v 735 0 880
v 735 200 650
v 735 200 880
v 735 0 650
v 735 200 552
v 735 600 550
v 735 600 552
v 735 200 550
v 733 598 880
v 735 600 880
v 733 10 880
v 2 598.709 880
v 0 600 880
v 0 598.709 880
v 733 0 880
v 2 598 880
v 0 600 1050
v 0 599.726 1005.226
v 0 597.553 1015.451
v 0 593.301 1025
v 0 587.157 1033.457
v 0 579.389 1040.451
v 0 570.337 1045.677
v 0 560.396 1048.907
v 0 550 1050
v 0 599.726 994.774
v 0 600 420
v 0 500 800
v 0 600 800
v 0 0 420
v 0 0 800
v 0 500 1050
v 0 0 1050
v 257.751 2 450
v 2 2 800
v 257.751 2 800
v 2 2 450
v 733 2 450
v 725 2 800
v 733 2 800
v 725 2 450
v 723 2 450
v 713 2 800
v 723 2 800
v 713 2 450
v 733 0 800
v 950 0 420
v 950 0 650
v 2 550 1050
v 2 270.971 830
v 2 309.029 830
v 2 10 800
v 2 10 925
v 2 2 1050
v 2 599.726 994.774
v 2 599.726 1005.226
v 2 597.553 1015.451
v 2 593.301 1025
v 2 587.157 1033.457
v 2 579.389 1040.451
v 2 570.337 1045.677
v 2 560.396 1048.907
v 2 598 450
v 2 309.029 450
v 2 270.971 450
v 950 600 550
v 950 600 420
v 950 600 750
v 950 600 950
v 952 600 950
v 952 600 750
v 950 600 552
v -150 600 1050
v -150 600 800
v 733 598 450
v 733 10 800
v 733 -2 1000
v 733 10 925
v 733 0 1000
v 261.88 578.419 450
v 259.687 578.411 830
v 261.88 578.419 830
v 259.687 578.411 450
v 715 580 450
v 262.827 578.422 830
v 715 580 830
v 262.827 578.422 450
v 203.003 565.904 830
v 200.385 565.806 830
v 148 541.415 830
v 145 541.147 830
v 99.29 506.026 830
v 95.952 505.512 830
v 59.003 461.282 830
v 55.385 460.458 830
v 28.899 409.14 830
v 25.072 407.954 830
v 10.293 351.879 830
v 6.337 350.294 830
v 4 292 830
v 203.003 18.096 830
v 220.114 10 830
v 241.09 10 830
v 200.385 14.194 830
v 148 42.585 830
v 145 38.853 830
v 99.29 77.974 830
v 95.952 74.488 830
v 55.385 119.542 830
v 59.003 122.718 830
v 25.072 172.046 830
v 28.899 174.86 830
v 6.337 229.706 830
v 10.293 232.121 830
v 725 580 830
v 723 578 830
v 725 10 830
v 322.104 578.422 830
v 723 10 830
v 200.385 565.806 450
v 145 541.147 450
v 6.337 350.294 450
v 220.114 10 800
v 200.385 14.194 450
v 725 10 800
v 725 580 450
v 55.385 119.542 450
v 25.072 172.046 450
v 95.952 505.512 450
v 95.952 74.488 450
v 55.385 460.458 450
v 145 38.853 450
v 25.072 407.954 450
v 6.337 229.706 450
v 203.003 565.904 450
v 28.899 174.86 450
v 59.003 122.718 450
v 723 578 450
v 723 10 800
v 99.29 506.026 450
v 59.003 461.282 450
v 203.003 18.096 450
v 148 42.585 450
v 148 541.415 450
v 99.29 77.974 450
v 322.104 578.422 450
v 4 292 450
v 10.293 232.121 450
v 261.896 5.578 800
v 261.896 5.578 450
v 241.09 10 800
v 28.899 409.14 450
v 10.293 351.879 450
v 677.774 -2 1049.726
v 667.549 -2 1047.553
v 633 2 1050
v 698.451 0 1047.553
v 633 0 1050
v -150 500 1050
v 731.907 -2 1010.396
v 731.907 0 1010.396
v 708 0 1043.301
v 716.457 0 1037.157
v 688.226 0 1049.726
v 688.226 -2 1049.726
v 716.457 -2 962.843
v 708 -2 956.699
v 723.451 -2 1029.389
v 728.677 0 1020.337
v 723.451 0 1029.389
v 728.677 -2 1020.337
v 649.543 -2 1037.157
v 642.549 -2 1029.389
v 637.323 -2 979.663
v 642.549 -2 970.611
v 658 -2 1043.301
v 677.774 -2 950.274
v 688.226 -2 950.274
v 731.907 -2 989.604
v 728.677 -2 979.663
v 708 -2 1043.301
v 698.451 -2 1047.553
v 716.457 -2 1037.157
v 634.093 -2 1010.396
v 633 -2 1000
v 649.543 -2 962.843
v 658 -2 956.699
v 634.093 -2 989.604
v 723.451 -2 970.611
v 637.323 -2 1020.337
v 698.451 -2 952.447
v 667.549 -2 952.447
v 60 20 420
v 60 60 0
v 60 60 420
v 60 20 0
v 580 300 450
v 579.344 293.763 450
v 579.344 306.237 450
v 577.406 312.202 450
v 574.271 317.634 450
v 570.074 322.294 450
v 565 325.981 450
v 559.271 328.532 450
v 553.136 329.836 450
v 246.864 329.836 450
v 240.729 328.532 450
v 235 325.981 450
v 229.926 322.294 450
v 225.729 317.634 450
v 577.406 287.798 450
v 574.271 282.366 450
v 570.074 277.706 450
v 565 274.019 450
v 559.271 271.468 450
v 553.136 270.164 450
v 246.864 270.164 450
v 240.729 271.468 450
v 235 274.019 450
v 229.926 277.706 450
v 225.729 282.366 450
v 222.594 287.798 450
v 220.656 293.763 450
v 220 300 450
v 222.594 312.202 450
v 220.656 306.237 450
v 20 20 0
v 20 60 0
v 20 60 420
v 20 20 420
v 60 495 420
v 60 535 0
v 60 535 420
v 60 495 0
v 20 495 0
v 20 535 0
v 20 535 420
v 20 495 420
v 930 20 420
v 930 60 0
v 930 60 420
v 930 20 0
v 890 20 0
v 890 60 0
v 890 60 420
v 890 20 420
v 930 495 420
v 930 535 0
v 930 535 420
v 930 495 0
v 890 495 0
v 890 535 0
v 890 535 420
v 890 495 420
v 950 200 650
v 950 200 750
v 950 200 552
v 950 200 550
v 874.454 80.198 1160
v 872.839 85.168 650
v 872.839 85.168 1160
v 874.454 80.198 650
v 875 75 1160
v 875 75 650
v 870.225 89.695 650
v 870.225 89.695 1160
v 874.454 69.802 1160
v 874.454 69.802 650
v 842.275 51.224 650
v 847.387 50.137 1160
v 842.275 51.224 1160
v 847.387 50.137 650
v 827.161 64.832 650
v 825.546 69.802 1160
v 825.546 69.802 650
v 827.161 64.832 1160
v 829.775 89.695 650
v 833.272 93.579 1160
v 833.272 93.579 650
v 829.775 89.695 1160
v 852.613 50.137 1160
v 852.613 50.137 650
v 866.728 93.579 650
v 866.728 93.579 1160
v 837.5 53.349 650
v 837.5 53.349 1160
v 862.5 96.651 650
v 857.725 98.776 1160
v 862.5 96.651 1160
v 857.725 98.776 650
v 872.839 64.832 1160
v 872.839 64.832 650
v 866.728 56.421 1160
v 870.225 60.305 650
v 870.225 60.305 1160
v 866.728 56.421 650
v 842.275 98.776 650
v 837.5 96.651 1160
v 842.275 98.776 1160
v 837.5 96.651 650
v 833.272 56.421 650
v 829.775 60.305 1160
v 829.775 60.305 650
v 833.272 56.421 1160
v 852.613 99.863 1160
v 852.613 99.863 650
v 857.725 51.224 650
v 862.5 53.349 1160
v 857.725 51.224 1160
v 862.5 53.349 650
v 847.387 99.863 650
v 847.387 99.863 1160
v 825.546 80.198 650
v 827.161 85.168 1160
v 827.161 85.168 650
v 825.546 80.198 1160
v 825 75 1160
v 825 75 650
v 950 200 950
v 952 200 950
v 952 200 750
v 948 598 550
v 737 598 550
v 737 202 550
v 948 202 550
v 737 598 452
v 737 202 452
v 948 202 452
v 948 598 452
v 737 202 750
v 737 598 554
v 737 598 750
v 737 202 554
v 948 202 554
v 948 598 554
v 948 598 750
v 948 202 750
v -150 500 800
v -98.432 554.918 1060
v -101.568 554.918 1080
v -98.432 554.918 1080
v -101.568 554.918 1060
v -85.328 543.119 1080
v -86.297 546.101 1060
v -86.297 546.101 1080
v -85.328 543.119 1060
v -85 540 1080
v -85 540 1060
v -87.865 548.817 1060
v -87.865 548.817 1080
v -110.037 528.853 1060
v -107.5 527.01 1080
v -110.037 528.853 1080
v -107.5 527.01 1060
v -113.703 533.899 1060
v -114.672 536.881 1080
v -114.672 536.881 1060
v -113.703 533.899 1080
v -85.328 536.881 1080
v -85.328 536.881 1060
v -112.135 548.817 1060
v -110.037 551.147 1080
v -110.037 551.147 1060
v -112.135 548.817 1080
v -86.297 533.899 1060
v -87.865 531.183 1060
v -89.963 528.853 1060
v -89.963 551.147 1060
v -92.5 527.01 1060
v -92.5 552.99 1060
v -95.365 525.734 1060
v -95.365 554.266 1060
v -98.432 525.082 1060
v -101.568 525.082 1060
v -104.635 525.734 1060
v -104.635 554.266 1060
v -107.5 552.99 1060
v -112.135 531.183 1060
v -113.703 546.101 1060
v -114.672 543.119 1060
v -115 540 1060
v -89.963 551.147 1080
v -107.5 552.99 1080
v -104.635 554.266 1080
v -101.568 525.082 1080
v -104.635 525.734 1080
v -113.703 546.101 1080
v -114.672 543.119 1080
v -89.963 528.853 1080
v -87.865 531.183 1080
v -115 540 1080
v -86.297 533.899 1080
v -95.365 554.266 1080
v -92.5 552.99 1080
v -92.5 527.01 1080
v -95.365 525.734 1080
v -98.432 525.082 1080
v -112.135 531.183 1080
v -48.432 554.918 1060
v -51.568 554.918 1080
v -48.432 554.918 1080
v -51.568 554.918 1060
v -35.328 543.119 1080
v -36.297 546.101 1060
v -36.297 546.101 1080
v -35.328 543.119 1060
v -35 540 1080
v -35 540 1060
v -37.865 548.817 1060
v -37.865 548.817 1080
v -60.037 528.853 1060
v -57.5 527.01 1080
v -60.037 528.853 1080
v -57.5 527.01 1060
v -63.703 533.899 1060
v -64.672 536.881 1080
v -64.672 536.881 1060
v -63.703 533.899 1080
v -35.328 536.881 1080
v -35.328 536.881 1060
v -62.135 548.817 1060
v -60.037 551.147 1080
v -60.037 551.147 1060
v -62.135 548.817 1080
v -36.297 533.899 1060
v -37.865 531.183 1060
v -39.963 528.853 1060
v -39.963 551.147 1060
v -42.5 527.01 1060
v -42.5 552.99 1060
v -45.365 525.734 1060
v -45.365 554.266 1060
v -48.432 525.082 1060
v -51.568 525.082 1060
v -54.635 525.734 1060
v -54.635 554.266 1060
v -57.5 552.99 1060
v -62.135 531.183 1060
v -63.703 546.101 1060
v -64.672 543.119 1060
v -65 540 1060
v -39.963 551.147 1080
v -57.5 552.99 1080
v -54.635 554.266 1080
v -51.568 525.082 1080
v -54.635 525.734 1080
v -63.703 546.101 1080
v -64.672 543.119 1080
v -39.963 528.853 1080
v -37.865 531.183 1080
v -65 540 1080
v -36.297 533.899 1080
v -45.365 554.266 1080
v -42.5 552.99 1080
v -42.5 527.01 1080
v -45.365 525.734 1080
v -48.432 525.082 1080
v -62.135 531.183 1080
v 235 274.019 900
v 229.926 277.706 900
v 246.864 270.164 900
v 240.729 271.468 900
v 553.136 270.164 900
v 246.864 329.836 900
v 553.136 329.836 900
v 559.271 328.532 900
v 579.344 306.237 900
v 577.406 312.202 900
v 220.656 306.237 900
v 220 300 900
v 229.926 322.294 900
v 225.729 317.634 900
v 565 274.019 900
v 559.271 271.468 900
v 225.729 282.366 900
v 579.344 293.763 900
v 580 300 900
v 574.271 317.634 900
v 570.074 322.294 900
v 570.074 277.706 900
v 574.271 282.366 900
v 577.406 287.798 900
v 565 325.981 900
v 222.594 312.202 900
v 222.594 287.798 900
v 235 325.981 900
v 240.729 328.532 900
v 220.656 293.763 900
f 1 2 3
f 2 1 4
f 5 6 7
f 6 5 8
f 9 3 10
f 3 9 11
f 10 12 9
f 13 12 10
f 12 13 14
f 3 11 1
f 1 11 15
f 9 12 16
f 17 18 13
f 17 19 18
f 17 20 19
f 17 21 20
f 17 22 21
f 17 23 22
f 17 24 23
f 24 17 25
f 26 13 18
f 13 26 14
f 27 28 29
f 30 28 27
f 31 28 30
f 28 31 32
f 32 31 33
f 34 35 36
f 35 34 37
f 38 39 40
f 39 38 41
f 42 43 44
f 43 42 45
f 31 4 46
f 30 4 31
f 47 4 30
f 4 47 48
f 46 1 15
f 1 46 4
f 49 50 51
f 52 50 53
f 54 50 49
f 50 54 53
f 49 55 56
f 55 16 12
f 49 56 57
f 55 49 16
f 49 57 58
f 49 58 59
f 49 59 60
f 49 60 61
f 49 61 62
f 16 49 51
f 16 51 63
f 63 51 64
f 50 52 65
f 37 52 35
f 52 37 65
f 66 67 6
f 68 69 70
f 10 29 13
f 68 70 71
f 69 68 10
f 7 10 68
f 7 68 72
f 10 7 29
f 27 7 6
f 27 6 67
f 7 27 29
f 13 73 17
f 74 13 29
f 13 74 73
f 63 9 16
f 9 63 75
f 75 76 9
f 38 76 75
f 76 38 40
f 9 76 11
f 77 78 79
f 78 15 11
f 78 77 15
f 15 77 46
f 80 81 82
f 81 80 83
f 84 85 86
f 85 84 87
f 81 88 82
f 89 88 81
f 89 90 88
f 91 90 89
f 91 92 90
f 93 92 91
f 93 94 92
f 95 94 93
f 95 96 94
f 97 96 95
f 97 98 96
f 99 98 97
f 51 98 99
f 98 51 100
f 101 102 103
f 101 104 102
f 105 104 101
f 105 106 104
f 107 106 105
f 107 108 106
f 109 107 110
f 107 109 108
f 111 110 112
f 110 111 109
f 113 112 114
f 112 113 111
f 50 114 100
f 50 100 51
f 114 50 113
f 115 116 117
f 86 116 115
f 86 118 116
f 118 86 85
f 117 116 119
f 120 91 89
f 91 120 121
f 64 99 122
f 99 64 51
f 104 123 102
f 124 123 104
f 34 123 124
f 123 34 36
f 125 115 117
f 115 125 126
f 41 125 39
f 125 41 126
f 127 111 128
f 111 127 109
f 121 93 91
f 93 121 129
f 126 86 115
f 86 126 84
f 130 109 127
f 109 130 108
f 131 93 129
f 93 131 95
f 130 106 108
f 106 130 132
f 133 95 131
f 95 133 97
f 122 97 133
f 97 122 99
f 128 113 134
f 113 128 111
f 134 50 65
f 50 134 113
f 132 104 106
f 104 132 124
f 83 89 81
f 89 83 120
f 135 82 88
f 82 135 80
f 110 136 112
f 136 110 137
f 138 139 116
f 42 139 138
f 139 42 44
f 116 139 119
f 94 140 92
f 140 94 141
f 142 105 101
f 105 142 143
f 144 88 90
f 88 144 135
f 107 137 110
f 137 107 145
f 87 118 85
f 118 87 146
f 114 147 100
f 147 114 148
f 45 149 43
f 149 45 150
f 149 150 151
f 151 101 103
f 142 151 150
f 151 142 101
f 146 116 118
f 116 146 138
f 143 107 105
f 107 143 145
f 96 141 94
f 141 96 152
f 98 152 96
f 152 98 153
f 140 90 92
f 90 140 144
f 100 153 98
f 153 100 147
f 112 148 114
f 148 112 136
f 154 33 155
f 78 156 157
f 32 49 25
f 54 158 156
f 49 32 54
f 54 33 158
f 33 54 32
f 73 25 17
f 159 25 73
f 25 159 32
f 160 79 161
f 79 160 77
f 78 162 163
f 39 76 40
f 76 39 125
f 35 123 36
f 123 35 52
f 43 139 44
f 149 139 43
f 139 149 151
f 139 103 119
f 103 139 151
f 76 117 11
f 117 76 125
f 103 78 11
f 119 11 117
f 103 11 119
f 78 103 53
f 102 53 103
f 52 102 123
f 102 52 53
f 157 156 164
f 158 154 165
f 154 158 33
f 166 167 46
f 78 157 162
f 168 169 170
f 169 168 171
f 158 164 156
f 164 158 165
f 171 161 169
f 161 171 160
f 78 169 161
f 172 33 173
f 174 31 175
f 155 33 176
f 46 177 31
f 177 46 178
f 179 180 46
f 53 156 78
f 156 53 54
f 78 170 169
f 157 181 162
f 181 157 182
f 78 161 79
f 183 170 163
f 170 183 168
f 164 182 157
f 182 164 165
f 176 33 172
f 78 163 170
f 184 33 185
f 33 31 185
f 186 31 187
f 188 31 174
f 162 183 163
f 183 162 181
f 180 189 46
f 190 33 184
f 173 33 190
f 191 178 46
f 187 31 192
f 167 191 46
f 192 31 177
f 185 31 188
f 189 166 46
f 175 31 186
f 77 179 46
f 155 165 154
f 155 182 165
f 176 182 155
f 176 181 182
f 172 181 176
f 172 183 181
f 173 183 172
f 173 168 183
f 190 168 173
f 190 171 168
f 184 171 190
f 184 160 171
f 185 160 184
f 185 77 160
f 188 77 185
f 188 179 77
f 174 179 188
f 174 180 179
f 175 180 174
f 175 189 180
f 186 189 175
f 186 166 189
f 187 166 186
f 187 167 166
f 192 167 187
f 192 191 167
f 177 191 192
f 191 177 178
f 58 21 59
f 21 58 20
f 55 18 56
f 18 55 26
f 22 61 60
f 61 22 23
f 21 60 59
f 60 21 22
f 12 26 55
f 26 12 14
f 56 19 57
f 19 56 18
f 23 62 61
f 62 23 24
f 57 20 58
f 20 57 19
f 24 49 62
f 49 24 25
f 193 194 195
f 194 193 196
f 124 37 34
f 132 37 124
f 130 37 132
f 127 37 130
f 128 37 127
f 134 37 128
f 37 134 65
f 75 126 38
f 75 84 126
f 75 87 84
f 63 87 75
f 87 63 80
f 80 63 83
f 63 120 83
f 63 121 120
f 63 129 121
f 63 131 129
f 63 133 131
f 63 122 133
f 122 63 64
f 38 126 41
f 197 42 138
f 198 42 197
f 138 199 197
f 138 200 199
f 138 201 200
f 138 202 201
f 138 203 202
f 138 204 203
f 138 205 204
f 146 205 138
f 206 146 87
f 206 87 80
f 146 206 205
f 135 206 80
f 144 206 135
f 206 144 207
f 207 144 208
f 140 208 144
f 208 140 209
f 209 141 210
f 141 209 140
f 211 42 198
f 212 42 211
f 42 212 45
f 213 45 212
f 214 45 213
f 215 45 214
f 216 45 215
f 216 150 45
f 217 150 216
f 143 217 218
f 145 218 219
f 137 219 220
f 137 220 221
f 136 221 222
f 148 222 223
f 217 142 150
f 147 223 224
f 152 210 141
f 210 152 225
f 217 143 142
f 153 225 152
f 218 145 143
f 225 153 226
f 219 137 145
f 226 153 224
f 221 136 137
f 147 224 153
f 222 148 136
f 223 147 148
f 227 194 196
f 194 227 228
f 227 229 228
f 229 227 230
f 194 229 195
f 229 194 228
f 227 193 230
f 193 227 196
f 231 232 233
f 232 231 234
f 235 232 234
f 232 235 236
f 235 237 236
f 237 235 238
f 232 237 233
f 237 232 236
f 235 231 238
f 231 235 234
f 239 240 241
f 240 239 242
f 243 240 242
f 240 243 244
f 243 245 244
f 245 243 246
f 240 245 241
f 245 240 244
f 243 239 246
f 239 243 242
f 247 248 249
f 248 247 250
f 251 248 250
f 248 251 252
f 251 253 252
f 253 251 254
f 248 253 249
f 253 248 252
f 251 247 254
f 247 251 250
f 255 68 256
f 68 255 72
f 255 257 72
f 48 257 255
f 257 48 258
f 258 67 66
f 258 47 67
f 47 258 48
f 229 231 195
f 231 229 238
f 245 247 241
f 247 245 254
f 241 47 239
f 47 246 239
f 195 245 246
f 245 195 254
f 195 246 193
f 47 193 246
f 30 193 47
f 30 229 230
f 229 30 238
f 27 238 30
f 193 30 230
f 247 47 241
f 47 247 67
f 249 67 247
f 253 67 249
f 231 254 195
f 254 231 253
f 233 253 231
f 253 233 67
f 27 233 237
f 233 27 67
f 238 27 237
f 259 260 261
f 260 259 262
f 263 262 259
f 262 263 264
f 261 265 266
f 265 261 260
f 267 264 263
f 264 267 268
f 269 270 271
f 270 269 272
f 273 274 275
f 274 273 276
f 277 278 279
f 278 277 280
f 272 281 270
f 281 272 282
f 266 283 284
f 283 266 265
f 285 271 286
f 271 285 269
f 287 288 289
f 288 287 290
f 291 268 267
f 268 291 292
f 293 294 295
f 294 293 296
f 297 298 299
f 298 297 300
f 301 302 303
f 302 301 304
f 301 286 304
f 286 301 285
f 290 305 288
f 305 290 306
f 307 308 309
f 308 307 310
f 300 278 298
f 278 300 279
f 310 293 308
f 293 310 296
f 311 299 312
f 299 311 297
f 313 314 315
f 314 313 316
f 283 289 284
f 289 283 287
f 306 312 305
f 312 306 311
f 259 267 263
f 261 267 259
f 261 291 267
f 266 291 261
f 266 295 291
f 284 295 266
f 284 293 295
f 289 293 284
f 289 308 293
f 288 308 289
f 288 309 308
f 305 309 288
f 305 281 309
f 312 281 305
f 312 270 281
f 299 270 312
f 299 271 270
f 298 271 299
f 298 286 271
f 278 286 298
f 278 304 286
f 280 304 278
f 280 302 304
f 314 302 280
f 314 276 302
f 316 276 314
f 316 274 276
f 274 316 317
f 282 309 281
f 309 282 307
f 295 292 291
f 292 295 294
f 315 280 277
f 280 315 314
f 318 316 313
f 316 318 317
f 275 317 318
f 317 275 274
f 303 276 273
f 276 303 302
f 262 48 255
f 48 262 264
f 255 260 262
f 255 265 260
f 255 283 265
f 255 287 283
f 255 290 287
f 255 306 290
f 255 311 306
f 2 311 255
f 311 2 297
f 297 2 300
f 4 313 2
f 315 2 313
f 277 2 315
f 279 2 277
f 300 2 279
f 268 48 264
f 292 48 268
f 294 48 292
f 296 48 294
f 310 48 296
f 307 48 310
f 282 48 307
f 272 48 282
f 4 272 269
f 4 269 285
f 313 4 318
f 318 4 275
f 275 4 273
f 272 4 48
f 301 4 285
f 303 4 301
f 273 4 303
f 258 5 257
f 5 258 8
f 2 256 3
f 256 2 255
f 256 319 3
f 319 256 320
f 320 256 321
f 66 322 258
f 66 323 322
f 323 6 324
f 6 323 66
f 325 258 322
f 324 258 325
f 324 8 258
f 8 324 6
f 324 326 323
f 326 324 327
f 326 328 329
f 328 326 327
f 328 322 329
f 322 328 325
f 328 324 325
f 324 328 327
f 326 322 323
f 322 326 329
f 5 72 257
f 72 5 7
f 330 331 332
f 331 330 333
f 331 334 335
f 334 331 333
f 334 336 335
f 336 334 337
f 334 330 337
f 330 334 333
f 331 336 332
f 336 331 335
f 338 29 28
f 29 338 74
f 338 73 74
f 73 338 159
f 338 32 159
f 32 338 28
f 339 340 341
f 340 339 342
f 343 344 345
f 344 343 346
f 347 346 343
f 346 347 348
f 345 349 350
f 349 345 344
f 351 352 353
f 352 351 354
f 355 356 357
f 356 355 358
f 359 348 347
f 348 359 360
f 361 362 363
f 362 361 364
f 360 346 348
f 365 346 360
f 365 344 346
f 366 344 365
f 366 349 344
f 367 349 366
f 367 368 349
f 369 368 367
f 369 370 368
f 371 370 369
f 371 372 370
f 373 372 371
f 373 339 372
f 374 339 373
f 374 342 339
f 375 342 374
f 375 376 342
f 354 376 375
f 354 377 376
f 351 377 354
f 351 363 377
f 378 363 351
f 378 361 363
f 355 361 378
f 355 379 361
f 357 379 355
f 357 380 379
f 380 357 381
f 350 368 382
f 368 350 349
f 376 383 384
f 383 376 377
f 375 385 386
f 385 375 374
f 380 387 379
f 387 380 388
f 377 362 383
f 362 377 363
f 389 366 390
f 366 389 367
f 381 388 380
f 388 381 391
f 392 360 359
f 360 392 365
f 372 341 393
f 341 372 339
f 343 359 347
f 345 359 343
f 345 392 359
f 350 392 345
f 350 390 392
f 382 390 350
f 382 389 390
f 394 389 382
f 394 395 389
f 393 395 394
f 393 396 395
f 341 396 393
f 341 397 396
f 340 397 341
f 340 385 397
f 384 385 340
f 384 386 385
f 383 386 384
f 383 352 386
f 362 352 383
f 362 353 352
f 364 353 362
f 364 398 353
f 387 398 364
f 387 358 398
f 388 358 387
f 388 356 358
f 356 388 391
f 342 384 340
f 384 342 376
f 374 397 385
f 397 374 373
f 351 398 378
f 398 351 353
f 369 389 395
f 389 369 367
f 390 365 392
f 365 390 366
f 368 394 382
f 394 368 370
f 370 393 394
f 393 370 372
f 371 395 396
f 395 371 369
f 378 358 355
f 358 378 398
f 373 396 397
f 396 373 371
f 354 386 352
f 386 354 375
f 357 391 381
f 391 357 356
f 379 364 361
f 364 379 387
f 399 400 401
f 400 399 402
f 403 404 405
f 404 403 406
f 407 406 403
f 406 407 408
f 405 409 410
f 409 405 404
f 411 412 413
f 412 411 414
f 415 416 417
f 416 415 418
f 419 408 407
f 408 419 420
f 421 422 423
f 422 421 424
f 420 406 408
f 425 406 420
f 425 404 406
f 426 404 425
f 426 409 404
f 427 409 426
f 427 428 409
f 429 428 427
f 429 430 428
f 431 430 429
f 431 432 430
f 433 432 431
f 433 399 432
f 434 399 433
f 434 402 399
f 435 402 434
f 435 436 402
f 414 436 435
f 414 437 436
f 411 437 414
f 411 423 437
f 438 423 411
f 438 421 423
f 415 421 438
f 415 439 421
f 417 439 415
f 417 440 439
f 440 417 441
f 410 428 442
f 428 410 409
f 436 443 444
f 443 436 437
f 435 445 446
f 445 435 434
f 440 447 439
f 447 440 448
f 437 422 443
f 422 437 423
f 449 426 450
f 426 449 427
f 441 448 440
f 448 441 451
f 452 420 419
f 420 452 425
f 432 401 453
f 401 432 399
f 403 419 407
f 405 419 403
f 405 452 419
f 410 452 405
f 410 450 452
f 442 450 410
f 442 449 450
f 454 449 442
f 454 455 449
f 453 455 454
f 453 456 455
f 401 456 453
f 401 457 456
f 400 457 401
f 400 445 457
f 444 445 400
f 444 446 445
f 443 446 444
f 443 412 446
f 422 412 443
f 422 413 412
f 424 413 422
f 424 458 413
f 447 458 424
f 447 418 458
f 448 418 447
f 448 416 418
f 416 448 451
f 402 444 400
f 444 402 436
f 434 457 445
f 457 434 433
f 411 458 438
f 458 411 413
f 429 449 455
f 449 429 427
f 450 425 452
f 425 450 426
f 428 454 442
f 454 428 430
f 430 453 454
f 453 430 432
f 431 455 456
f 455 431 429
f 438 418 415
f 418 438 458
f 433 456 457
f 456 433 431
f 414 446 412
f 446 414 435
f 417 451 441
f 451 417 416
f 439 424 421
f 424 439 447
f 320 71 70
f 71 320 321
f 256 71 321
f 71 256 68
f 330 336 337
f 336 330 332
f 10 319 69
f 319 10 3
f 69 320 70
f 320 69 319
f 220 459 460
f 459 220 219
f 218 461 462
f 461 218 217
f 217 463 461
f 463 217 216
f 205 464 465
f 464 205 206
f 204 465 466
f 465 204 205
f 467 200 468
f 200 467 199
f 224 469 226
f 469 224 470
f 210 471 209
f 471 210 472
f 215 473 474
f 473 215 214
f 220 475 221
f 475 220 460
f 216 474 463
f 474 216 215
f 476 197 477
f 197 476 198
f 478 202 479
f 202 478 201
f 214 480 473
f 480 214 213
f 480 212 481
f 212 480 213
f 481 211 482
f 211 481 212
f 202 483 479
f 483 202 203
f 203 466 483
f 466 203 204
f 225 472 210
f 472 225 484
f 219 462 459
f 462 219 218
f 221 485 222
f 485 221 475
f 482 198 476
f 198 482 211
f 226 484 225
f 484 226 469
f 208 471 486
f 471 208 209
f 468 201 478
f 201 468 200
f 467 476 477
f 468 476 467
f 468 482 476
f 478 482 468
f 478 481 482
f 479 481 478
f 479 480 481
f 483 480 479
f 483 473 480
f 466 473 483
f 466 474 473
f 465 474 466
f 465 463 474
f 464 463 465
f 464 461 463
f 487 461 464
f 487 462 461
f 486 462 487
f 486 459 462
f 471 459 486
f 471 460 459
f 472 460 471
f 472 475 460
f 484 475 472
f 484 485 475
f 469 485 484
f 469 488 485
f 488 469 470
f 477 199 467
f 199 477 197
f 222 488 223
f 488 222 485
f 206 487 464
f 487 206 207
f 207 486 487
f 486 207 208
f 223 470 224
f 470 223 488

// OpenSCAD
maruzen_rotary_fryer();
module maruzen_rotary_fryer(){
  translate([0,0,430]) fryer_body();
  translate([0,0,430]) fryer_oilpan();
  translate([0,0,800]) fryer_oilshield();
  fryer_base();
  control_box();
  translate([950, 600, 450])rotate([0,0,180])fryer_oilbox();
  translate([950-215, 200, 450+300]) food_basket();
  translate([0,0,450]) color("dimgray")rotary_plate();
  translate([-150, 500, 800]) fryer_controller();
}

module fryer_body(){
  color("silver"){
    cube([735, 2, 450]);
    cube([2, 600, 450]);
    translate([0,600-2,0]) cube([735,2,450]);
    translate([735-2,0]) cube([2,600, 450]);
  }
}

module fryer_oilpan(){
  color("silver"){
  difference(){
    hull(){
      translate([290,290,0])cylinder(h=400, r=290);
      translate([735-20, 0,0]) cube([10, 580, 400]);
    }
    hull(){
      translate([290+2,290+2,2])cylinder(h=400, r=290-2);
      translate([735-20-2, 2,2]) cube([10, 580-4, 400]);
    }
  }
  }
}

module fryer_oilshield(){
  filet=50;
  color("silver"){
  hull(){
    translate([0,0,0])cube([733-filet *2,2, 250]);
    translate([0,0,0])cube([733, 10, 125]);
    translate([733-filet, 0, 250-filet])rotate([90,0,0])cylinder(h=2, r=filet);
  }
  hull(){
    translate([0,0,0])cube([2,600-filet*2-2, 250]);
    translate([0,0,0])cube([2, 600-2, 125]);
    translate([0, 600-filet, 250-filet])rotate([0,90,0])cylinder(h=2, r=filet);
  }
  }
}

module fryer_base(){
  color("silver"){
  translate([0,0,450-30])cube([950, 600, 30]);
  for(i=[0:870:950]){
    translate([i+20, 20, 0])cube([40,40,450]);
    translate([i+20, 600-85-20, 0])cube([40,40,450]);
  }
  }
}

module control_box(){
  color("silver") {
    translate([950-100, 75, 450])cylinder(h=1400-450-240, r=25);
    translate([950-215, 0, 450]) cube([215, 200,200]);
  }
}

module fryer_oilbox(){
  color("silver"){
    translate([0,0,0]) drawer(215, 400, 100);
    translate([0,0,102]) drawer(215, 400, 200);
  }
}

module drawer(x, y, z) {
  t=2;
  difference(){
    translate([0,0,0]) cube([x,y,z]);
    translate([t,t,t]) cube([x-t*2, y-t*2, z]);
  }
}

module fryer_controller(){
  color("silver") {
    cube([150, 100, 250]);
    translate([50, 40, 260]) cylinder(h=20, r=15);
    translate([100, 40, 260]) cylinder(h=20, r=15);
  }
}

module food_basket(){
  t=2; 
  color("whitesmoke")
  difference(){
    hull(){
      translate([0,0,0]) cube([t, 400, 130]);
      translate([215,0,0]) cube([t, 400, 200]);
    }
  }
}

module rotary_plate(){
  t=2;
  hull(){
    translate([250, 300, 0]) cylinder(h=450, r=30);
    translate([550, 300, 0]) cylinder(h=450, r=30);
  }
}
